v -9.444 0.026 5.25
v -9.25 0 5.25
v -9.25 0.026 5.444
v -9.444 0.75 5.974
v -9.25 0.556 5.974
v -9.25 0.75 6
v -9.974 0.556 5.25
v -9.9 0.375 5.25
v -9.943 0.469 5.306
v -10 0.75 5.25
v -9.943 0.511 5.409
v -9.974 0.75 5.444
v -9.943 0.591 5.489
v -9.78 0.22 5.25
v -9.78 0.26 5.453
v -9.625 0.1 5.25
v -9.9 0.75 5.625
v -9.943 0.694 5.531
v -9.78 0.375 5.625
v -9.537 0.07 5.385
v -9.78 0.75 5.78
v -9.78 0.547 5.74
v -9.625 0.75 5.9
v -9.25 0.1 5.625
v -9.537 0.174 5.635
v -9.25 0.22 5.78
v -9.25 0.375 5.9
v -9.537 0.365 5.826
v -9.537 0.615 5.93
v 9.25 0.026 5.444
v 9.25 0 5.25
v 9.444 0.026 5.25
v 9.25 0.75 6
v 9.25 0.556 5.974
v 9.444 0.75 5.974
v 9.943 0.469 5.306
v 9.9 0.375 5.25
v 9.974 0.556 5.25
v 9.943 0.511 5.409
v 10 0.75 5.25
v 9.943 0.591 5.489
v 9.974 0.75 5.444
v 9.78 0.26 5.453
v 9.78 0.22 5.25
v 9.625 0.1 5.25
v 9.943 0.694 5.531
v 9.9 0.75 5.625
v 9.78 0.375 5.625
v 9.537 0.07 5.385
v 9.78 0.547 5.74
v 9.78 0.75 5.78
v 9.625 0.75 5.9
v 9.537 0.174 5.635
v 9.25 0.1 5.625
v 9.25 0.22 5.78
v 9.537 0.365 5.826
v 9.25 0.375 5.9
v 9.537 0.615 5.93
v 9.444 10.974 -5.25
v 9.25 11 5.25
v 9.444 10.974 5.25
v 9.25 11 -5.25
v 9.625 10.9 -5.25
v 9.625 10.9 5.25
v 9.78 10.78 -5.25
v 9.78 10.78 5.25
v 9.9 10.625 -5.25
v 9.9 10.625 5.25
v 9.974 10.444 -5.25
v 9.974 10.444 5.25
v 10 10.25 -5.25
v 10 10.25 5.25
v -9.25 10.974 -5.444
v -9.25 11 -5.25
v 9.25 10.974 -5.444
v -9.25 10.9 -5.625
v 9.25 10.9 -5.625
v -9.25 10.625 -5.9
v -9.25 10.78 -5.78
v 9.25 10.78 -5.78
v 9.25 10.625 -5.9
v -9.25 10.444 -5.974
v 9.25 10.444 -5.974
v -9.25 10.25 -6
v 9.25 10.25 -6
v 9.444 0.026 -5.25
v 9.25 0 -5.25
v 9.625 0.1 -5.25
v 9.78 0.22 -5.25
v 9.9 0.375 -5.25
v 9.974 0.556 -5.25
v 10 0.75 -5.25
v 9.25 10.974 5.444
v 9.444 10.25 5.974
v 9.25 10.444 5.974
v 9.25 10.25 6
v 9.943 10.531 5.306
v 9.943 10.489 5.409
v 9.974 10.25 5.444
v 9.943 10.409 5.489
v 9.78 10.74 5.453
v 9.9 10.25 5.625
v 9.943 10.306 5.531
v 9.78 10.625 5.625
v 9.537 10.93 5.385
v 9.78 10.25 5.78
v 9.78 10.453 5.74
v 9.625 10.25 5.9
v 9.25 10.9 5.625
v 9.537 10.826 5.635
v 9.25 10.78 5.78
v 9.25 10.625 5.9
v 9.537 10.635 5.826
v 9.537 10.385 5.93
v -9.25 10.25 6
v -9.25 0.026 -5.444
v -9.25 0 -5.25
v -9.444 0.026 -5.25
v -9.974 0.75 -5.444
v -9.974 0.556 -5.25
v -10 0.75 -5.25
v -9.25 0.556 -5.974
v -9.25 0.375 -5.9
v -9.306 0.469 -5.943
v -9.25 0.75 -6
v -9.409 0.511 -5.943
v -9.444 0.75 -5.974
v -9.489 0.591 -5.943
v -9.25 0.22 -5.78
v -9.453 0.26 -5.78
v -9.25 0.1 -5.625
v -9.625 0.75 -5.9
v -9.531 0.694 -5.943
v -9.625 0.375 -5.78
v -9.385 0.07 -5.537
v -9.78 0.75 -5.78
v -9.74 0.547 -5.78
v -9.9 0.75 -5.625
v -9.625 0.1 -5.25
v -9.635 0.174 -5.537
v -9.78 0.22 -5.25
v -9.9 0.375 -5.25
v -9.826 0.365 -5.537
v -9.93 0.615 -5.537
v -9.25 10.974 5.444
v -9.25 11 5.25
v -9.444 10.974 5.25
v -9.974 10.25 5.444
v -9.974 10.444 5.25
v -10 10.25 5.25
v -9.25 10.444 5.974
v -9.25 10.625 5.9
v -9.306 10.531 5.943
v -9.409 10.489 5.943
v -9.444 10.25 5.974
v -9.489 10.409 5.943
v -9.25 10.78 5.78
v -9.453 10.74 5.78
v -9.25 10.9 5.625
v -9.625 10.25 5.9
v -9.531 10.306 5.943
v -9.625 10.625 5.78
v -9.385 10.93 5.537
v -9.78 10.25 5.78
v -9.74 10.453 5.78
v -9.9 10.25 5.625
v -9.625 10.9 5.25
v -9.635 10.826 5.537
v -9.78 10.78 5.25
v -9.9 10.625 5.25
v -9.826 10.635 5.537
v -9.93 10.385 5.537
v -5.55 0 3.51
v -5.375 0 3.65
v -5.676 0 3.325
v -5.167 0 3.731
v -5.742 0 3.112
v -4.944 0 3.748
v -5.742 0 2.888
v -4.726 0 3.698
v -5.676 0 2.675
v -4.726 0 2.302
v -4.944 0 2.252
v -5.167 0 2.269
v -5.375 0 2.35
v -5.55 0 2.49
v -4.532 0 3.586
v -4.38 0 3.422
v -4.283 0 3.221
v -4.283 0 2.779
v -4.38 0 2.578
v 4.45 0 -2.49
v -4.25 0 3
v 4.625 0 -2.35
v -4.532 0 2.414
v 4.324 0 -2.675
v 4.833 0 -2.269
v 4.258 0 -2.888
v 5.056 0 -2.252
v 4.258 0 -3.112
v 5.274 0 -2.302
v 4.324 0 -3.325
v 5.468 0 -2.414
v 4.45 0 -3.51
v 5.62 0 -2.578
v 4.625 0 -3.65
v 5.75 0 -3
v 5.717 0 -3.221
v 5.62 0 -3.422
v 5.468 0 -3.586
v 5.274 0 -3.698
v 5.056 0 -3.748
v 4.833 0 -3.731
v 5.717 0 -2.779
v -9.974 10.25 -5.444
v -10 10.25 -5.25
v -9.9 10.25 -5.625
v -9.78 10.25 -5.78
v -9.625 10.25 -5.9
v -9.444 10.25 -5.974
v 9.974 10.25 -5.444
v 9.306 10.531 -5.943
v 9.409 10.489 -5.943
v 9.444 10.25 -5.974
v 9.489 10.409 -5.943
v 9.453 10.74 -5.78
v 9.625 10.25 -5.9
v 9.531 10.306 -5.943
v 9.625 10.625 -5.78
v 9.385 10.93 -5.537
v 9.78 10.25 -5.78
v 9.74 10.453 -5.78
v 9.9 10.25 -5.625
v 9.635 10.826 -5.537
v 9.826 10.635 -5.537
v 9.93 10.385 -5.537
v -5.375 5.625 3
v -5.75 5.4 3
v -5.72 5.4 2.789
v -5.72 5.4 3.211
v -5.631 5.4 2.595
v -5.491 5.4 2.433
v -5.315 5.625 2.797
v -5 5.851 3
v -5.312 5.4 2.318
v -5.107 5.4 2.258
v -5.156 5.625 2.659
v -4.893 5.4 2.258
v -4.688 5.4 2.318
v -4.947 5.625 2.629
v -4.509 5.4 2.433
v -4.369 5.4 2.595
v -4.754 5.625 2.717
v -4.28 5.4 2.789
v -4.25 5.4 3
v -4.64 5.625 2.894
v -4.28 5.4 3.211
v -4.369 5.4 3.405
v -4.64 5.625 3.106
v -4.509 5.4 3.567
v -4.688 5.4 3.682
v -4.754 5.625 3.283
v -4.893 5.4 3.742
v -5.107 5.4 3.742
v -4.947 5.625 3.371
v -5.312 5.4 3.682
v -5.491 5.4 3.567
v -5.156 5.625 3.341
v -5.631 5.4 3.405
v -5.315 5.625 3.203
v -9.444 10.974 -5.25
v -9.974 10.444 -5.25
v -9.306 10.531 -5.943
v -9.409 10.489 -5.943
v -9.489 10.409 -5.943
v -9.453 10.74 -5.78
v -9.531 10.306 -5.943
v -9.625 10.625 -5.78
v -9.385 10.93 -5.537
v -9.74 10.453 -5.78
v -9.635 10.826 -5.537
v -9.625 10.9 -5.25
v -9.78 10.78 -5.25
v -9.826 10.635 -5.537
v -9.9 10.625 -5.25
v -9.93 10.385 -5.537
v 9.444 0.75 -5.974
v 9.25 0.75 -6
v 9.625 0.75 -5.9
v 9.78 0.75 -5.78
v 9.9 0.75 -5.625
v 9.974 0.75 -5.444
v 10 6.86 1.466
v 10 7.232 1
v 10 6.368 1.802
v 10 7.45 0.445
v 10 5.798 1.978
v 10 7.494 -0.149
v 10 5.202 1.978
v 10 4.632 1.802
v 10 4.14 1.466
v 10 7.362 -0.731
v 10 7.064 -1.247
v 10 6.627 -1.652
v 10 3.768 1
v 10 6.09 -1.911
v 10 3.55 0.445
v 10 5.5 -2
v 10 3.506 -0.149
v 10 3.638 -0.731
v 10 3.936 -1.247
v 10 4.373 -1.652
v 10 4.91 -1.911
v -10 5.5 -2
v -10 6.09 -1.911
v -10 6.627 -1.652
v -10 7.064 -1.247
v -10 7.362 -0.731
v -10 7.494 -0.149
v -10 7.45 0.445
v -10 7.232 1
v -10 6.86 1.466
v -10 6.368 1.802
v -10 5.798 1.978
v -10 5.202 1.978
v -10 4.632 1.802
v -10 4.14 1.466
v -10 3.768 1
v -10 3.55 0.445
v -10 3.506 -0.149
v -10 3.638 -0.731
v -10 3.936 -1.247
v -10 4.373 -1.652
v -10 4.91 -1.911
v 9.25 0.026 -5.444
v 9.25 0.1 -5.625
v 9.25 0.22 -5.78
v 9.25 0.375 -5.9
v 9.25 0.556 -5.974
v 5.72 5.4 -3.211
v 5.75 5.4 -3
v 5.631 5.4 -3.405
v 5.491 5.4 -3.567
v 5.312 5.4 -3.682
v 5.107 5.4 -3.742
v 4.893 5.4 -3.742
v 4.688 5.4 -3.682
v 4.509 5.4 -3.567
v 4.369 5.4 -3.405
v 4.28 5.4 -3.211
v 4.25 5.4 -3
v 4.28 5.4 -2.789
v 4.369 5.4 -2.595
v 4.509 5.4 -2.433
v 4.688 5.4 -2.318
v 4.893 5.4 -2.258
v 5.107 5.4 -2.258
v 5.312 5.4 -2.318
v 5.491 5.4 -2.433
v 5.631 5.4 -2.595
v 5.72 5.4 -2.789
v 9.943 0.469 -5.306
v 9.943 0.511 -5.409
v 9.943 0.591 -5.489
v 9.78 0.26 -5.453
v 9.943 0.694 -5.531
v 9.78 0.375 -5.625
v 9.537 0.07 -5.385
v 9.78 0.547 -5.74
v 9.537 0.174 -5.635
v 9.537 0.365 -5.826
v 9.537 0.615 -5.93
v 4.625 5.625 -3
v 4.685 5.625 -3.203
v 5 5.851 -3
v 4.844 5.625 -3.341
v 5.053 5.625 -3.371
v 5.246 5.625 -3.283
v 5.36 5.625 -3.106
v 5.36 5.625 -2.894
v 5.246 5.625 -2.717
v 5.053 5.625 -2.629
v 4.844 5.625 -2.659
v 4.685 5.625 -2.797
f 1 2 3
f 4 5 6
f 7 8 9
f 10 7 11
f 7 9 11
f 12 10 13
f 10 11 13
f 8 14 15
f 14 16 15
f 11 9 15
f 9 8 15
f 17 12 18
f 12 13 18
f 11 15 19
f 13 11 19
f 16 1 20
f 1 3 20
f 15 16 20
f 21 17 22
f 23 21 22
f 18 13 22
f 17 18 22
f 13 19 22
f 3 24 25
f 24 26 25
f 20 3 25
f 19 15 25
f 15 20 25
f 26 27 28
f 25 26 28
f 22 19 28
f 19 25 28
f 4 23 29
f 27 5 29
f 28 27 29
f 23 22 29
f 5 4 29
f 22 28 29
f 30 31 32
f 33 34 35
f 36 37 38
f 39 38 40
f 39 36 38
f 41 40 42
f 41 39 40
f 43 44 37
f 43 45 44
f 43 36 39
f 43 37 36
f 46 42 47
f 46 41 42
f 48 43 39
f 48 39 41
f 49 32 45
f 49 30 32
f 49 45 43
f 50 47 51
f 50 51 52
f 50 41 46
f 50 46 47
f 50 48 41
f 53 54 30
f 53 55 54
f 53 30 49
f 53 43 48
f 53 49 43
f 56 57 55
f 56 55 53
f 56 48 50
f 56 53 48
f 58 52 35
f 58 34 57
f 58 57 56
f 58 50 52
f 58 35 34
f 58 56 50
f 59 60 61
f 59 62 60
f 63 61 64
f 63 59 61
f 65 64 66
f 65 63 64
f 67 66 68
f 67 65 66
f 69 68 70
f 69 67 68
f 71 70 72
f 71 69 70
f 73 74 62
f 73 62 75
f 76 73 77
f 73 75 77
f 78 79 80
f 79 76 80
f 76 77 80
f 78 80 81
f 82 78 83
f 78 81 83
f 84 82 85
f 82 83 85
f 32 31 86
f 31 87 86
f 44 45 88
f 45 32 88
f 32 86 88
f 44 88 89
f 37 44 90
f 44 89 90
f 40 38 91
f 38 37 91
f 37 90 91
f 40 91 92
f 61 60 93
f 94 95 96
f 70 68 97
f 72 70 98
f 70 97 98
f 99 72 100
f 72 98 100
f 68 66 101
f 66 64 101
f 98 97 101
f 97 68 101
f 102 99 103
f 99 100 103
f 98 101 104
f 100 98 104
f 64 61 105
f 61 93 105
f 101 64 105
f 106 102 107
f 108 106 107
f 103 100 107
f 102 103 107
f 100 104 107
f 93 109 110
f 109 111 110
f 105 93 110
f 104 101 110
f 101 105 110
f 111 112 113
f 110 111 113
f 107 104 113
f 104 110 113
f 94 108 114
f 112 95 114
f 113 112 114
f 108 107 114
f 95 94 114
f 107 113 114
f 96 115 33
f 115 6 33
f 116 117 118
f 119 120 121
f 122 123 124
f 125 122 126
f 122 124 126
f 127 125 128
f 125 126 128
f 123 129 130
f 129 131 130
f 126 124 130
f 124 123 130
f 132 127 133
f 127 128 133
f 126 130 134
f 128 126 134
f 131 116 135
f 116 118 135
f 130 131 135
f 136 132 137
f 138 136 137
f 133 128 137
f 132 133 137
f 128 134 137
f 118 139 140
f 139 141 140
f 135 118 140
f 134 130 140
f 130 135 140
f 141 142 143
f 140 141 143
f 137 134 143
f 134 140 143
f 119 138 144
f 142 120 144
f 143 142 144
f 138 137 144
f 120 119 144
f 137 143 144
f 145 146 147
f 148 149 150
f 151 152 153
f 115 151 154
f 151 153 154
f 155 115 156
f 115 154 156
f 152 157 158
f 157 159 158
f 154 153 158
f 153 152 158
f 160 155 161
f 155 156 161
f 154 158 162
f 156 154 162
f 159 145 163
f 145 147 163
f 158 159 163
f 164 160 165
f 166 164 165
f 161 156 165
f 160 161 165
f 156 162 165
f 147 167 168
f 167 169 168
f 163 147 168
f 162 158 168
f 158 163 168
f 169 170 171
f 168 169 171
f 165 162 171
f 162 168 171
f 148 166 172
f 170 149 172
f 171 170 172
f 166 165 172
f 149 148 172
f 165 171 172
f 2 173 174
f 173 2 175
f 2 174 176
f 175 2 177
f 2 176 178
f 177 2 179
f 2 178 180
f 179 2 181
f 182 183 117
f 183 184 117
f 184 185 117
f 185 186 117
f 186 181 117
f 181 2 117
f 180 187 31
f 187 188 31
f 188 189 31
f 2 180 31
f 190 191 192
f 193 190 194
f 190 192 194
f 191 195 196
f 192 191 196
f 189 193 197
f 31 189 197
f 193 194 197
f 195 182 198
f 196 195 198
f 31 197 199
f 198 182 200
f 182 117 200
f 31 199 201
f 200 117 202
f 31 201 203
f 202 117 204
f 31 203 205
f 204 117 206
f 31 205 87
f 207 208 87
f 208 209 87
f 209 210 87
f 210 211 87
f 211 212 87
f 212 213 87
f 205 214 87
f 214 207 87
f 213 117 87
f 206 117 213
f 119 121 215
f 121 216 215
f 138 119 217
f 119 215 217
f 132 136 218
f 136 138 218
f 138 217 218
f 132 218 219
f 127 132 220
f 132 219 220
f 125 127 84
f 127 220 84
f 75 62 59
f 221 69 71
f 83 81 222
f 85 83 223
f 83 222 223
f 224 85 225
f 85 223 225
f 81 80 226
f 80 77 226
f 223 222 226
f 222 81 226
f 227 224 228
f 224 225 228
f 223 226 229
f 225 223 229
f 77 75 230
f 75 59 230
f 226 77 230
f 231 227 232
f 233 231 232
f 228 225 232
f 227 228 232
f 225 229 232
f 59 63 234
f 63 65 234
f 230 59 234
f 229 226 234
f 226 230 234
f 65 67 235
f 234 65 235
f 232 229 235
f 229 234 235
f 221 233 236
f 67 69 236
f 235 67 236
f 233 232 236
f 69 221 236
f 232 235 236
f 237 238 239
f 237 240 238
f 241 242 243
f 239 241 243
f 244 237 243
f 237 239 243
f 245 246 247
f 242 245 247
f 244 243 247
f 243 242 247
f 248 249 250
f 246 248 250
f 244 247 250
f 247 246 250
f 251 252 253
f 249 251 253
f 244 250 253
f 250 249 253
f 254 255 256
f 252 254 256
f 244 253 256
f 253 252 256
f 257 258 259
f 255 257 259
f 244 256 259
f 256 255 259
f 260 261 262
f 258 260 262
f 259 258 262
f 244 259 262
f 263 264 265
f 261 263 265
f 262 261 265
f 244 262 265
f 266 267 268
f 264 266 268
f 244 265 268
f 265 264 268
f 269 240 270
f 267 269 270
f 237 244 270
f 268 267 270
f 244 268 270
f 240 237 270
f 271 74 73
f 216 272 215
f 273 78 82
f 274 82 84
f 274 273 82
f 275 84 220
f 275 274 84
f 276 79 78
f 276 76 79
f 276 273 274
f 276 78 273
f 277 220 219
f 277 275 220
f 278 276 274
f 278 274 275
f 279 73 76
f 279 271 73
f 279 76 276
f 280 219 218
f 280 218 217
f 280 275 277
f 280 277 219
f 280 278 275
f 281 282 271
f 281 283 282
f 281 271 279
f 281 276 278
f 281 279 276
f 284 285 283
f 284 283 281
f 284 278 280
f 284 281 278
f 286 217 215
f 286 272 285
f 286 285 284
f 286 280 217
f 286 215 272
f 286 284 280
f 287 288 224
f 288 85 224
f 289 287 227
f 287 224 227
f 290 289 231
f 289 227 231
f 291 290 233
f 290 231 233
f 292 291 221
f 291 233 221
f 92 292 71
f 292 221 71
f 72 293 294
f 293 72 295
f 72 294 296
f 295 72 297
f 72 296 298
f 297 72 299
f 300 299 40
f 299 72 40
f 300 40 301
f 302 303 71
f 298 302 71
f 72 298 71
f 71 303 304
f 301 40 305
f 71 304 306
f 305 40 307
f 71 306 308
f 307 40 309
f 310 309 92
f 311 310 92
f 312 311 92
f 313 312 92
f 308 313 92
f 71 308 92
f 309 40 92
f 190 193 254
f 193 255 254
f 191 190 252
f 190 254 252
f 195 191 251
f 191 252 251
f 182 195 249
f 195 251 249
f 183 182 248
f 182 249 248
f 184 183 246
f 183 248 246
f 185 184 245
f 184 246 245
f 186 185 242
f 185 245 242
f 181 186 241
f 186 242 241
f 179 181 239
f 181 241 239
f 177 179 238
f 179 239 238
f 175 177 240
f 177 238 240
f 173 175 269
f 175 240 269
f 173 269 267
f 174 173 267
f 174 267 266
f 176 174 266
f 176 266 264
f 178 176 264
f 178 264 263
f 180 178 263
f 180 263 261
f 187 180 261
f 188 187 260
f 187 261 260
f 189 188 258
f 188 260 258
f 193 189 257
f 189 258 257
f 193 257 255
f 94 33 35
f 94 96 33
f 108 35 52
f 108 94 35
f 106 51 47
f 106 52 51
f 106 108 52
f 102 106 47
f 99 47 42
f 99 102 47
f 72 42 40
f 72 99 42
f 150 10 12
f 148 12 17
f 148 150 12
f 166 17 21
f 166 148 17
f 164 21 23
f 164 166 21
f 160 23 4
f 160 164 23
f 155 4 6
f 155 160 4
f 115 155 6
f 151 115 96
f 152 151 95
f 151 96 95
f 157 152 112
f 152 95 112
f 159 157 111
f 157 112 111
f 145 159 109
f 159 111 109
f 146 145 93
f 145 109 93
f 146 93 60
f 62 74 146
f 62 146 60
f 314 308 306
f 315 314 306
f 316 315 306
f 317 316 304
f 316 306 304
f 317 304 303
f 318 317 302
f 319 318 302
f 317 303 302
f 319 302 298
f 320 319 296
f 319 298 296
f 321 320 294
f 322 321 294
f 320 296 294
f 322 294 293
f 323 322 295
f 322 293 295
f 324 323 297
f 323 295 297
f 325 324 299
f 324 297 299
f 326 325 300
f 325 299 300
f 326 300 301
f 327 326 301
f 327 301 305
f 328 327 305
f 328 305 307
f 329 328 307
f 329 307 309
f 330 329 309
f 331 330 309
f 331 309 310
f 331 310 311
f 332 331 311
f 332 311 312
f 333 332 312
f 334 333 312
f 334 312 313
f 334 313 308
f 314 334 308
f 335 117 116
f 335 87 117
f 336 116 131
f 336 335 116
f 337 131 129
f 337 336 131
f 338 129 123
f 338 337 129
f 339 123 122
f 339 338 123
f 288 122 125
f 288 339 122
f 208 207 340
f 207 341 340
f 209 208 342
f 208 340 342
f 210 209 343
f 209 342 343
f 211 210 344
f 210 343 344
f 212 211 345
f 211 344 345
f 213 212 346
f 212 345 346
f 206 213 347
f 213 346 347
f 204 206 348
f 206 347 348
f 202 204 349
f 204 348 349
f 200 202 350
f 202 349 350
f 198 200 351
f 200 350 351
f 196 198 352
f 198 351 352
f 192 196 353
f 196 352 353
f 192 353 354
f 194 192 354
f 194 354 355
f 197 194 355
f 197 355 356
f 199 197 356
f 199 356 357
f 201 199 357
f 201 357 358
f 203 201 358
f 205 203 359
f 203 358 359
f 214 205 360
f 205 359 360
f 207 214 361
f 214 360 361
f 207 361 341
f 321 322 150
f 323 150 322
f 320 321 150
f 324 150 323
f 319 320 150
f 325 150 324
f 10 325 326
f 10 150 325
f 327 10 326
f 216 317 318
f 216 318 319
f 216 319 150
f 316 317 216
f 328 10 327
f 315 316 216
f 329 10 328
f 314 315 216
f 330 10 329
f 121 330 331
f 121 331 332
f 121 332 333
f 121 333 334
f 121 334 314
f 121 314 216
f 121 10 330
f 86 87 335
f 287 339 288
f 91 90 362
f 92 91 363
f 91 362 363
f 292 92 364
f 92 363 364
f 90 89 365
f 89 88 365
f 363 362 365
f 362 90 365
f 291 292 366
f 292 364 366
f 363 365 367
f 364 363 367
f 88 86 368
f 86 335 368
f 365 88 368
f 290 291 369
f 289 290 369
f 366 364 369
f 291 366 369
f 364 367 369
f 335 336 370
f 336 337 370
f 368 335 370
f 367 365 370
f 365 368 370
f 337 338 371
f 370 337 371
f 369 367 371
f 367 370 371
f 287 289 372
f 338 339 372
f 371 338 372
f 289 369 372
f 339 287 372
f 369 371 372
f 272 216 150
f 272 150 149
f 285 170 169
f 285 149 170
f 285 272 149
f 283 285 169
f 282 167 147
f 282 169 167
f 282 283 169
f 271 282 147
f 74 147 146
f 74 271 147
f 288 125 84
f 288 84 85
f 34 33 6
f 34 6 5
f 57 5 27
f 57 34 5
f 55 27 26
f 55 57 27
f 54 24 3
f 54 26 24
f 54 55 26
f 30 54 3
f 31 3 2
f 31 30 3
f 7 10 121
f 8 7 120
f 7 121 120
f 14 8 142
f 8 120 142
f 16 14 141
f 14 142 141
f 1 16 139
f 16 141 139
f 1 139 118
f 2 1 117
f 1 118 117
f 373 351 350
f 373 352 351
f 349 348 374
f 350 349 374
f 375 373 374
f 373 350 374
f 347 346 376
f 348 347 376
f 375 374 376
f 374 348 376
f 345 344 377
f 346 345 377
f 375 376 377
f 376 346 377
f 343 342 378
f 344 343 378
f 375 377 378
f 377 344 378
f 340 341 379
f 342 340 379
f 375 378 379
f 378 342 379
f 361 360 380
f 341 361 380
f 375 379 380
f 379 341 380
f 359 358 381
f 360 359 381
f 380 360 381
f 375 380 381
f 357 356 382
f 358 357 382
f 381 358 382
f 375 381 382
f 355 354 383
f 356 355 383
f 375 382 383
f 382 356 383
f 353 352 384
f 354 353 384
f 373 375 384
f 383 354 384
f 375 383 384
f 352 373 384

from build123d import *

# Parameters (mm, degrees)
SKETCH1_W                      = 20
SKETCH1_H                      = 12
BOSS_EXTRUDE1_DEPTH            = 11
F_1_5_1_5_DIAMETER_HOLE1_D     = 1.5
F_1_5_1_5_DIAMETER_HOLE1_DEPTH = 5.4
F_1_5_1_5_DIAMETER_HOLE1_TIP   = 0.450645464
SKETCH6_R                      = 2
CUT_EXTRUDE1_DEPTH             = 24.600847442
FILLET1_R                      = 0.75


with BuildPart() as part:
    # Sketch1 → Boss-Extrude1 (new body)
    with BuildSketch(Plane(origin=(0, 0, 0), x_dir=(1, 0, 0), z_dir=(0, 1, 0))):
        Rectangle(SKETCH1_W, SKETCH1_H)
    extrude(amount=BOSS_EXTRUDE1_DEPTH)

    # Ø1.5 (1.5) Diameter Hole1
    with Locations(Plane(origin=(0, 0, 0), x_dir=(-1, 0, 0), z_dir=(0, -1, 0))):
        with Locations((-5, 3), (5, -3)):
            Hole(F_1_5_1_5_DIAMETER_HOLE1_D / 2, depth=F_1_5_1_5_DIAMETER_HOLE1_DEPTH)
            with Locations((0, 0, -(F_1_5_1_5_DIAMETER_HOLE1_DEPTH + F_1_5_1_5_DIAMETER_HOLE1_TIP / 2))):  # 118° drill point
                Cone(0, F_1_5_1_5_DIAMETER_HOLE1_D / 2, F_1_5_1_5_DIAMETER_HOLE1_TIP, mode=Mode.SUBTRACT)

    # Sketch6 → Cut-Extrude1 (cut, through all)
    with BuildSketch(Plane(origin=(10, 0, 0), x_dir=(0, 0, -1), z_dir=(1, 0, 0))):
        with Locations((0, 5.5)):
            Circle(SKETCH6_R)
    extrude(amount=-CUT_EXTRUDE1_DEPTH, mode=Mode.SUBTRACT)

    # Fillet1
    fillet1_edges = [part.edges().sort_by_distance(p)[0] for p in [
        (-10, 11, 0),
        (0, 11, 6),
        (10, 11, 0),
        (0, 0, 6),
        (-10, 0, 0),
        (0, 0, -6),
        (10, 0, 0),
        (0, 11, -6),
        (10, 5.5, 6),
        (-10, 5.5, 6),
        (-10, 5.5, -6),
        (10, 5.5, -6),
    ]]
    fillet(fillet1_edges, radius=FILLET1_R)


solid = part.part
